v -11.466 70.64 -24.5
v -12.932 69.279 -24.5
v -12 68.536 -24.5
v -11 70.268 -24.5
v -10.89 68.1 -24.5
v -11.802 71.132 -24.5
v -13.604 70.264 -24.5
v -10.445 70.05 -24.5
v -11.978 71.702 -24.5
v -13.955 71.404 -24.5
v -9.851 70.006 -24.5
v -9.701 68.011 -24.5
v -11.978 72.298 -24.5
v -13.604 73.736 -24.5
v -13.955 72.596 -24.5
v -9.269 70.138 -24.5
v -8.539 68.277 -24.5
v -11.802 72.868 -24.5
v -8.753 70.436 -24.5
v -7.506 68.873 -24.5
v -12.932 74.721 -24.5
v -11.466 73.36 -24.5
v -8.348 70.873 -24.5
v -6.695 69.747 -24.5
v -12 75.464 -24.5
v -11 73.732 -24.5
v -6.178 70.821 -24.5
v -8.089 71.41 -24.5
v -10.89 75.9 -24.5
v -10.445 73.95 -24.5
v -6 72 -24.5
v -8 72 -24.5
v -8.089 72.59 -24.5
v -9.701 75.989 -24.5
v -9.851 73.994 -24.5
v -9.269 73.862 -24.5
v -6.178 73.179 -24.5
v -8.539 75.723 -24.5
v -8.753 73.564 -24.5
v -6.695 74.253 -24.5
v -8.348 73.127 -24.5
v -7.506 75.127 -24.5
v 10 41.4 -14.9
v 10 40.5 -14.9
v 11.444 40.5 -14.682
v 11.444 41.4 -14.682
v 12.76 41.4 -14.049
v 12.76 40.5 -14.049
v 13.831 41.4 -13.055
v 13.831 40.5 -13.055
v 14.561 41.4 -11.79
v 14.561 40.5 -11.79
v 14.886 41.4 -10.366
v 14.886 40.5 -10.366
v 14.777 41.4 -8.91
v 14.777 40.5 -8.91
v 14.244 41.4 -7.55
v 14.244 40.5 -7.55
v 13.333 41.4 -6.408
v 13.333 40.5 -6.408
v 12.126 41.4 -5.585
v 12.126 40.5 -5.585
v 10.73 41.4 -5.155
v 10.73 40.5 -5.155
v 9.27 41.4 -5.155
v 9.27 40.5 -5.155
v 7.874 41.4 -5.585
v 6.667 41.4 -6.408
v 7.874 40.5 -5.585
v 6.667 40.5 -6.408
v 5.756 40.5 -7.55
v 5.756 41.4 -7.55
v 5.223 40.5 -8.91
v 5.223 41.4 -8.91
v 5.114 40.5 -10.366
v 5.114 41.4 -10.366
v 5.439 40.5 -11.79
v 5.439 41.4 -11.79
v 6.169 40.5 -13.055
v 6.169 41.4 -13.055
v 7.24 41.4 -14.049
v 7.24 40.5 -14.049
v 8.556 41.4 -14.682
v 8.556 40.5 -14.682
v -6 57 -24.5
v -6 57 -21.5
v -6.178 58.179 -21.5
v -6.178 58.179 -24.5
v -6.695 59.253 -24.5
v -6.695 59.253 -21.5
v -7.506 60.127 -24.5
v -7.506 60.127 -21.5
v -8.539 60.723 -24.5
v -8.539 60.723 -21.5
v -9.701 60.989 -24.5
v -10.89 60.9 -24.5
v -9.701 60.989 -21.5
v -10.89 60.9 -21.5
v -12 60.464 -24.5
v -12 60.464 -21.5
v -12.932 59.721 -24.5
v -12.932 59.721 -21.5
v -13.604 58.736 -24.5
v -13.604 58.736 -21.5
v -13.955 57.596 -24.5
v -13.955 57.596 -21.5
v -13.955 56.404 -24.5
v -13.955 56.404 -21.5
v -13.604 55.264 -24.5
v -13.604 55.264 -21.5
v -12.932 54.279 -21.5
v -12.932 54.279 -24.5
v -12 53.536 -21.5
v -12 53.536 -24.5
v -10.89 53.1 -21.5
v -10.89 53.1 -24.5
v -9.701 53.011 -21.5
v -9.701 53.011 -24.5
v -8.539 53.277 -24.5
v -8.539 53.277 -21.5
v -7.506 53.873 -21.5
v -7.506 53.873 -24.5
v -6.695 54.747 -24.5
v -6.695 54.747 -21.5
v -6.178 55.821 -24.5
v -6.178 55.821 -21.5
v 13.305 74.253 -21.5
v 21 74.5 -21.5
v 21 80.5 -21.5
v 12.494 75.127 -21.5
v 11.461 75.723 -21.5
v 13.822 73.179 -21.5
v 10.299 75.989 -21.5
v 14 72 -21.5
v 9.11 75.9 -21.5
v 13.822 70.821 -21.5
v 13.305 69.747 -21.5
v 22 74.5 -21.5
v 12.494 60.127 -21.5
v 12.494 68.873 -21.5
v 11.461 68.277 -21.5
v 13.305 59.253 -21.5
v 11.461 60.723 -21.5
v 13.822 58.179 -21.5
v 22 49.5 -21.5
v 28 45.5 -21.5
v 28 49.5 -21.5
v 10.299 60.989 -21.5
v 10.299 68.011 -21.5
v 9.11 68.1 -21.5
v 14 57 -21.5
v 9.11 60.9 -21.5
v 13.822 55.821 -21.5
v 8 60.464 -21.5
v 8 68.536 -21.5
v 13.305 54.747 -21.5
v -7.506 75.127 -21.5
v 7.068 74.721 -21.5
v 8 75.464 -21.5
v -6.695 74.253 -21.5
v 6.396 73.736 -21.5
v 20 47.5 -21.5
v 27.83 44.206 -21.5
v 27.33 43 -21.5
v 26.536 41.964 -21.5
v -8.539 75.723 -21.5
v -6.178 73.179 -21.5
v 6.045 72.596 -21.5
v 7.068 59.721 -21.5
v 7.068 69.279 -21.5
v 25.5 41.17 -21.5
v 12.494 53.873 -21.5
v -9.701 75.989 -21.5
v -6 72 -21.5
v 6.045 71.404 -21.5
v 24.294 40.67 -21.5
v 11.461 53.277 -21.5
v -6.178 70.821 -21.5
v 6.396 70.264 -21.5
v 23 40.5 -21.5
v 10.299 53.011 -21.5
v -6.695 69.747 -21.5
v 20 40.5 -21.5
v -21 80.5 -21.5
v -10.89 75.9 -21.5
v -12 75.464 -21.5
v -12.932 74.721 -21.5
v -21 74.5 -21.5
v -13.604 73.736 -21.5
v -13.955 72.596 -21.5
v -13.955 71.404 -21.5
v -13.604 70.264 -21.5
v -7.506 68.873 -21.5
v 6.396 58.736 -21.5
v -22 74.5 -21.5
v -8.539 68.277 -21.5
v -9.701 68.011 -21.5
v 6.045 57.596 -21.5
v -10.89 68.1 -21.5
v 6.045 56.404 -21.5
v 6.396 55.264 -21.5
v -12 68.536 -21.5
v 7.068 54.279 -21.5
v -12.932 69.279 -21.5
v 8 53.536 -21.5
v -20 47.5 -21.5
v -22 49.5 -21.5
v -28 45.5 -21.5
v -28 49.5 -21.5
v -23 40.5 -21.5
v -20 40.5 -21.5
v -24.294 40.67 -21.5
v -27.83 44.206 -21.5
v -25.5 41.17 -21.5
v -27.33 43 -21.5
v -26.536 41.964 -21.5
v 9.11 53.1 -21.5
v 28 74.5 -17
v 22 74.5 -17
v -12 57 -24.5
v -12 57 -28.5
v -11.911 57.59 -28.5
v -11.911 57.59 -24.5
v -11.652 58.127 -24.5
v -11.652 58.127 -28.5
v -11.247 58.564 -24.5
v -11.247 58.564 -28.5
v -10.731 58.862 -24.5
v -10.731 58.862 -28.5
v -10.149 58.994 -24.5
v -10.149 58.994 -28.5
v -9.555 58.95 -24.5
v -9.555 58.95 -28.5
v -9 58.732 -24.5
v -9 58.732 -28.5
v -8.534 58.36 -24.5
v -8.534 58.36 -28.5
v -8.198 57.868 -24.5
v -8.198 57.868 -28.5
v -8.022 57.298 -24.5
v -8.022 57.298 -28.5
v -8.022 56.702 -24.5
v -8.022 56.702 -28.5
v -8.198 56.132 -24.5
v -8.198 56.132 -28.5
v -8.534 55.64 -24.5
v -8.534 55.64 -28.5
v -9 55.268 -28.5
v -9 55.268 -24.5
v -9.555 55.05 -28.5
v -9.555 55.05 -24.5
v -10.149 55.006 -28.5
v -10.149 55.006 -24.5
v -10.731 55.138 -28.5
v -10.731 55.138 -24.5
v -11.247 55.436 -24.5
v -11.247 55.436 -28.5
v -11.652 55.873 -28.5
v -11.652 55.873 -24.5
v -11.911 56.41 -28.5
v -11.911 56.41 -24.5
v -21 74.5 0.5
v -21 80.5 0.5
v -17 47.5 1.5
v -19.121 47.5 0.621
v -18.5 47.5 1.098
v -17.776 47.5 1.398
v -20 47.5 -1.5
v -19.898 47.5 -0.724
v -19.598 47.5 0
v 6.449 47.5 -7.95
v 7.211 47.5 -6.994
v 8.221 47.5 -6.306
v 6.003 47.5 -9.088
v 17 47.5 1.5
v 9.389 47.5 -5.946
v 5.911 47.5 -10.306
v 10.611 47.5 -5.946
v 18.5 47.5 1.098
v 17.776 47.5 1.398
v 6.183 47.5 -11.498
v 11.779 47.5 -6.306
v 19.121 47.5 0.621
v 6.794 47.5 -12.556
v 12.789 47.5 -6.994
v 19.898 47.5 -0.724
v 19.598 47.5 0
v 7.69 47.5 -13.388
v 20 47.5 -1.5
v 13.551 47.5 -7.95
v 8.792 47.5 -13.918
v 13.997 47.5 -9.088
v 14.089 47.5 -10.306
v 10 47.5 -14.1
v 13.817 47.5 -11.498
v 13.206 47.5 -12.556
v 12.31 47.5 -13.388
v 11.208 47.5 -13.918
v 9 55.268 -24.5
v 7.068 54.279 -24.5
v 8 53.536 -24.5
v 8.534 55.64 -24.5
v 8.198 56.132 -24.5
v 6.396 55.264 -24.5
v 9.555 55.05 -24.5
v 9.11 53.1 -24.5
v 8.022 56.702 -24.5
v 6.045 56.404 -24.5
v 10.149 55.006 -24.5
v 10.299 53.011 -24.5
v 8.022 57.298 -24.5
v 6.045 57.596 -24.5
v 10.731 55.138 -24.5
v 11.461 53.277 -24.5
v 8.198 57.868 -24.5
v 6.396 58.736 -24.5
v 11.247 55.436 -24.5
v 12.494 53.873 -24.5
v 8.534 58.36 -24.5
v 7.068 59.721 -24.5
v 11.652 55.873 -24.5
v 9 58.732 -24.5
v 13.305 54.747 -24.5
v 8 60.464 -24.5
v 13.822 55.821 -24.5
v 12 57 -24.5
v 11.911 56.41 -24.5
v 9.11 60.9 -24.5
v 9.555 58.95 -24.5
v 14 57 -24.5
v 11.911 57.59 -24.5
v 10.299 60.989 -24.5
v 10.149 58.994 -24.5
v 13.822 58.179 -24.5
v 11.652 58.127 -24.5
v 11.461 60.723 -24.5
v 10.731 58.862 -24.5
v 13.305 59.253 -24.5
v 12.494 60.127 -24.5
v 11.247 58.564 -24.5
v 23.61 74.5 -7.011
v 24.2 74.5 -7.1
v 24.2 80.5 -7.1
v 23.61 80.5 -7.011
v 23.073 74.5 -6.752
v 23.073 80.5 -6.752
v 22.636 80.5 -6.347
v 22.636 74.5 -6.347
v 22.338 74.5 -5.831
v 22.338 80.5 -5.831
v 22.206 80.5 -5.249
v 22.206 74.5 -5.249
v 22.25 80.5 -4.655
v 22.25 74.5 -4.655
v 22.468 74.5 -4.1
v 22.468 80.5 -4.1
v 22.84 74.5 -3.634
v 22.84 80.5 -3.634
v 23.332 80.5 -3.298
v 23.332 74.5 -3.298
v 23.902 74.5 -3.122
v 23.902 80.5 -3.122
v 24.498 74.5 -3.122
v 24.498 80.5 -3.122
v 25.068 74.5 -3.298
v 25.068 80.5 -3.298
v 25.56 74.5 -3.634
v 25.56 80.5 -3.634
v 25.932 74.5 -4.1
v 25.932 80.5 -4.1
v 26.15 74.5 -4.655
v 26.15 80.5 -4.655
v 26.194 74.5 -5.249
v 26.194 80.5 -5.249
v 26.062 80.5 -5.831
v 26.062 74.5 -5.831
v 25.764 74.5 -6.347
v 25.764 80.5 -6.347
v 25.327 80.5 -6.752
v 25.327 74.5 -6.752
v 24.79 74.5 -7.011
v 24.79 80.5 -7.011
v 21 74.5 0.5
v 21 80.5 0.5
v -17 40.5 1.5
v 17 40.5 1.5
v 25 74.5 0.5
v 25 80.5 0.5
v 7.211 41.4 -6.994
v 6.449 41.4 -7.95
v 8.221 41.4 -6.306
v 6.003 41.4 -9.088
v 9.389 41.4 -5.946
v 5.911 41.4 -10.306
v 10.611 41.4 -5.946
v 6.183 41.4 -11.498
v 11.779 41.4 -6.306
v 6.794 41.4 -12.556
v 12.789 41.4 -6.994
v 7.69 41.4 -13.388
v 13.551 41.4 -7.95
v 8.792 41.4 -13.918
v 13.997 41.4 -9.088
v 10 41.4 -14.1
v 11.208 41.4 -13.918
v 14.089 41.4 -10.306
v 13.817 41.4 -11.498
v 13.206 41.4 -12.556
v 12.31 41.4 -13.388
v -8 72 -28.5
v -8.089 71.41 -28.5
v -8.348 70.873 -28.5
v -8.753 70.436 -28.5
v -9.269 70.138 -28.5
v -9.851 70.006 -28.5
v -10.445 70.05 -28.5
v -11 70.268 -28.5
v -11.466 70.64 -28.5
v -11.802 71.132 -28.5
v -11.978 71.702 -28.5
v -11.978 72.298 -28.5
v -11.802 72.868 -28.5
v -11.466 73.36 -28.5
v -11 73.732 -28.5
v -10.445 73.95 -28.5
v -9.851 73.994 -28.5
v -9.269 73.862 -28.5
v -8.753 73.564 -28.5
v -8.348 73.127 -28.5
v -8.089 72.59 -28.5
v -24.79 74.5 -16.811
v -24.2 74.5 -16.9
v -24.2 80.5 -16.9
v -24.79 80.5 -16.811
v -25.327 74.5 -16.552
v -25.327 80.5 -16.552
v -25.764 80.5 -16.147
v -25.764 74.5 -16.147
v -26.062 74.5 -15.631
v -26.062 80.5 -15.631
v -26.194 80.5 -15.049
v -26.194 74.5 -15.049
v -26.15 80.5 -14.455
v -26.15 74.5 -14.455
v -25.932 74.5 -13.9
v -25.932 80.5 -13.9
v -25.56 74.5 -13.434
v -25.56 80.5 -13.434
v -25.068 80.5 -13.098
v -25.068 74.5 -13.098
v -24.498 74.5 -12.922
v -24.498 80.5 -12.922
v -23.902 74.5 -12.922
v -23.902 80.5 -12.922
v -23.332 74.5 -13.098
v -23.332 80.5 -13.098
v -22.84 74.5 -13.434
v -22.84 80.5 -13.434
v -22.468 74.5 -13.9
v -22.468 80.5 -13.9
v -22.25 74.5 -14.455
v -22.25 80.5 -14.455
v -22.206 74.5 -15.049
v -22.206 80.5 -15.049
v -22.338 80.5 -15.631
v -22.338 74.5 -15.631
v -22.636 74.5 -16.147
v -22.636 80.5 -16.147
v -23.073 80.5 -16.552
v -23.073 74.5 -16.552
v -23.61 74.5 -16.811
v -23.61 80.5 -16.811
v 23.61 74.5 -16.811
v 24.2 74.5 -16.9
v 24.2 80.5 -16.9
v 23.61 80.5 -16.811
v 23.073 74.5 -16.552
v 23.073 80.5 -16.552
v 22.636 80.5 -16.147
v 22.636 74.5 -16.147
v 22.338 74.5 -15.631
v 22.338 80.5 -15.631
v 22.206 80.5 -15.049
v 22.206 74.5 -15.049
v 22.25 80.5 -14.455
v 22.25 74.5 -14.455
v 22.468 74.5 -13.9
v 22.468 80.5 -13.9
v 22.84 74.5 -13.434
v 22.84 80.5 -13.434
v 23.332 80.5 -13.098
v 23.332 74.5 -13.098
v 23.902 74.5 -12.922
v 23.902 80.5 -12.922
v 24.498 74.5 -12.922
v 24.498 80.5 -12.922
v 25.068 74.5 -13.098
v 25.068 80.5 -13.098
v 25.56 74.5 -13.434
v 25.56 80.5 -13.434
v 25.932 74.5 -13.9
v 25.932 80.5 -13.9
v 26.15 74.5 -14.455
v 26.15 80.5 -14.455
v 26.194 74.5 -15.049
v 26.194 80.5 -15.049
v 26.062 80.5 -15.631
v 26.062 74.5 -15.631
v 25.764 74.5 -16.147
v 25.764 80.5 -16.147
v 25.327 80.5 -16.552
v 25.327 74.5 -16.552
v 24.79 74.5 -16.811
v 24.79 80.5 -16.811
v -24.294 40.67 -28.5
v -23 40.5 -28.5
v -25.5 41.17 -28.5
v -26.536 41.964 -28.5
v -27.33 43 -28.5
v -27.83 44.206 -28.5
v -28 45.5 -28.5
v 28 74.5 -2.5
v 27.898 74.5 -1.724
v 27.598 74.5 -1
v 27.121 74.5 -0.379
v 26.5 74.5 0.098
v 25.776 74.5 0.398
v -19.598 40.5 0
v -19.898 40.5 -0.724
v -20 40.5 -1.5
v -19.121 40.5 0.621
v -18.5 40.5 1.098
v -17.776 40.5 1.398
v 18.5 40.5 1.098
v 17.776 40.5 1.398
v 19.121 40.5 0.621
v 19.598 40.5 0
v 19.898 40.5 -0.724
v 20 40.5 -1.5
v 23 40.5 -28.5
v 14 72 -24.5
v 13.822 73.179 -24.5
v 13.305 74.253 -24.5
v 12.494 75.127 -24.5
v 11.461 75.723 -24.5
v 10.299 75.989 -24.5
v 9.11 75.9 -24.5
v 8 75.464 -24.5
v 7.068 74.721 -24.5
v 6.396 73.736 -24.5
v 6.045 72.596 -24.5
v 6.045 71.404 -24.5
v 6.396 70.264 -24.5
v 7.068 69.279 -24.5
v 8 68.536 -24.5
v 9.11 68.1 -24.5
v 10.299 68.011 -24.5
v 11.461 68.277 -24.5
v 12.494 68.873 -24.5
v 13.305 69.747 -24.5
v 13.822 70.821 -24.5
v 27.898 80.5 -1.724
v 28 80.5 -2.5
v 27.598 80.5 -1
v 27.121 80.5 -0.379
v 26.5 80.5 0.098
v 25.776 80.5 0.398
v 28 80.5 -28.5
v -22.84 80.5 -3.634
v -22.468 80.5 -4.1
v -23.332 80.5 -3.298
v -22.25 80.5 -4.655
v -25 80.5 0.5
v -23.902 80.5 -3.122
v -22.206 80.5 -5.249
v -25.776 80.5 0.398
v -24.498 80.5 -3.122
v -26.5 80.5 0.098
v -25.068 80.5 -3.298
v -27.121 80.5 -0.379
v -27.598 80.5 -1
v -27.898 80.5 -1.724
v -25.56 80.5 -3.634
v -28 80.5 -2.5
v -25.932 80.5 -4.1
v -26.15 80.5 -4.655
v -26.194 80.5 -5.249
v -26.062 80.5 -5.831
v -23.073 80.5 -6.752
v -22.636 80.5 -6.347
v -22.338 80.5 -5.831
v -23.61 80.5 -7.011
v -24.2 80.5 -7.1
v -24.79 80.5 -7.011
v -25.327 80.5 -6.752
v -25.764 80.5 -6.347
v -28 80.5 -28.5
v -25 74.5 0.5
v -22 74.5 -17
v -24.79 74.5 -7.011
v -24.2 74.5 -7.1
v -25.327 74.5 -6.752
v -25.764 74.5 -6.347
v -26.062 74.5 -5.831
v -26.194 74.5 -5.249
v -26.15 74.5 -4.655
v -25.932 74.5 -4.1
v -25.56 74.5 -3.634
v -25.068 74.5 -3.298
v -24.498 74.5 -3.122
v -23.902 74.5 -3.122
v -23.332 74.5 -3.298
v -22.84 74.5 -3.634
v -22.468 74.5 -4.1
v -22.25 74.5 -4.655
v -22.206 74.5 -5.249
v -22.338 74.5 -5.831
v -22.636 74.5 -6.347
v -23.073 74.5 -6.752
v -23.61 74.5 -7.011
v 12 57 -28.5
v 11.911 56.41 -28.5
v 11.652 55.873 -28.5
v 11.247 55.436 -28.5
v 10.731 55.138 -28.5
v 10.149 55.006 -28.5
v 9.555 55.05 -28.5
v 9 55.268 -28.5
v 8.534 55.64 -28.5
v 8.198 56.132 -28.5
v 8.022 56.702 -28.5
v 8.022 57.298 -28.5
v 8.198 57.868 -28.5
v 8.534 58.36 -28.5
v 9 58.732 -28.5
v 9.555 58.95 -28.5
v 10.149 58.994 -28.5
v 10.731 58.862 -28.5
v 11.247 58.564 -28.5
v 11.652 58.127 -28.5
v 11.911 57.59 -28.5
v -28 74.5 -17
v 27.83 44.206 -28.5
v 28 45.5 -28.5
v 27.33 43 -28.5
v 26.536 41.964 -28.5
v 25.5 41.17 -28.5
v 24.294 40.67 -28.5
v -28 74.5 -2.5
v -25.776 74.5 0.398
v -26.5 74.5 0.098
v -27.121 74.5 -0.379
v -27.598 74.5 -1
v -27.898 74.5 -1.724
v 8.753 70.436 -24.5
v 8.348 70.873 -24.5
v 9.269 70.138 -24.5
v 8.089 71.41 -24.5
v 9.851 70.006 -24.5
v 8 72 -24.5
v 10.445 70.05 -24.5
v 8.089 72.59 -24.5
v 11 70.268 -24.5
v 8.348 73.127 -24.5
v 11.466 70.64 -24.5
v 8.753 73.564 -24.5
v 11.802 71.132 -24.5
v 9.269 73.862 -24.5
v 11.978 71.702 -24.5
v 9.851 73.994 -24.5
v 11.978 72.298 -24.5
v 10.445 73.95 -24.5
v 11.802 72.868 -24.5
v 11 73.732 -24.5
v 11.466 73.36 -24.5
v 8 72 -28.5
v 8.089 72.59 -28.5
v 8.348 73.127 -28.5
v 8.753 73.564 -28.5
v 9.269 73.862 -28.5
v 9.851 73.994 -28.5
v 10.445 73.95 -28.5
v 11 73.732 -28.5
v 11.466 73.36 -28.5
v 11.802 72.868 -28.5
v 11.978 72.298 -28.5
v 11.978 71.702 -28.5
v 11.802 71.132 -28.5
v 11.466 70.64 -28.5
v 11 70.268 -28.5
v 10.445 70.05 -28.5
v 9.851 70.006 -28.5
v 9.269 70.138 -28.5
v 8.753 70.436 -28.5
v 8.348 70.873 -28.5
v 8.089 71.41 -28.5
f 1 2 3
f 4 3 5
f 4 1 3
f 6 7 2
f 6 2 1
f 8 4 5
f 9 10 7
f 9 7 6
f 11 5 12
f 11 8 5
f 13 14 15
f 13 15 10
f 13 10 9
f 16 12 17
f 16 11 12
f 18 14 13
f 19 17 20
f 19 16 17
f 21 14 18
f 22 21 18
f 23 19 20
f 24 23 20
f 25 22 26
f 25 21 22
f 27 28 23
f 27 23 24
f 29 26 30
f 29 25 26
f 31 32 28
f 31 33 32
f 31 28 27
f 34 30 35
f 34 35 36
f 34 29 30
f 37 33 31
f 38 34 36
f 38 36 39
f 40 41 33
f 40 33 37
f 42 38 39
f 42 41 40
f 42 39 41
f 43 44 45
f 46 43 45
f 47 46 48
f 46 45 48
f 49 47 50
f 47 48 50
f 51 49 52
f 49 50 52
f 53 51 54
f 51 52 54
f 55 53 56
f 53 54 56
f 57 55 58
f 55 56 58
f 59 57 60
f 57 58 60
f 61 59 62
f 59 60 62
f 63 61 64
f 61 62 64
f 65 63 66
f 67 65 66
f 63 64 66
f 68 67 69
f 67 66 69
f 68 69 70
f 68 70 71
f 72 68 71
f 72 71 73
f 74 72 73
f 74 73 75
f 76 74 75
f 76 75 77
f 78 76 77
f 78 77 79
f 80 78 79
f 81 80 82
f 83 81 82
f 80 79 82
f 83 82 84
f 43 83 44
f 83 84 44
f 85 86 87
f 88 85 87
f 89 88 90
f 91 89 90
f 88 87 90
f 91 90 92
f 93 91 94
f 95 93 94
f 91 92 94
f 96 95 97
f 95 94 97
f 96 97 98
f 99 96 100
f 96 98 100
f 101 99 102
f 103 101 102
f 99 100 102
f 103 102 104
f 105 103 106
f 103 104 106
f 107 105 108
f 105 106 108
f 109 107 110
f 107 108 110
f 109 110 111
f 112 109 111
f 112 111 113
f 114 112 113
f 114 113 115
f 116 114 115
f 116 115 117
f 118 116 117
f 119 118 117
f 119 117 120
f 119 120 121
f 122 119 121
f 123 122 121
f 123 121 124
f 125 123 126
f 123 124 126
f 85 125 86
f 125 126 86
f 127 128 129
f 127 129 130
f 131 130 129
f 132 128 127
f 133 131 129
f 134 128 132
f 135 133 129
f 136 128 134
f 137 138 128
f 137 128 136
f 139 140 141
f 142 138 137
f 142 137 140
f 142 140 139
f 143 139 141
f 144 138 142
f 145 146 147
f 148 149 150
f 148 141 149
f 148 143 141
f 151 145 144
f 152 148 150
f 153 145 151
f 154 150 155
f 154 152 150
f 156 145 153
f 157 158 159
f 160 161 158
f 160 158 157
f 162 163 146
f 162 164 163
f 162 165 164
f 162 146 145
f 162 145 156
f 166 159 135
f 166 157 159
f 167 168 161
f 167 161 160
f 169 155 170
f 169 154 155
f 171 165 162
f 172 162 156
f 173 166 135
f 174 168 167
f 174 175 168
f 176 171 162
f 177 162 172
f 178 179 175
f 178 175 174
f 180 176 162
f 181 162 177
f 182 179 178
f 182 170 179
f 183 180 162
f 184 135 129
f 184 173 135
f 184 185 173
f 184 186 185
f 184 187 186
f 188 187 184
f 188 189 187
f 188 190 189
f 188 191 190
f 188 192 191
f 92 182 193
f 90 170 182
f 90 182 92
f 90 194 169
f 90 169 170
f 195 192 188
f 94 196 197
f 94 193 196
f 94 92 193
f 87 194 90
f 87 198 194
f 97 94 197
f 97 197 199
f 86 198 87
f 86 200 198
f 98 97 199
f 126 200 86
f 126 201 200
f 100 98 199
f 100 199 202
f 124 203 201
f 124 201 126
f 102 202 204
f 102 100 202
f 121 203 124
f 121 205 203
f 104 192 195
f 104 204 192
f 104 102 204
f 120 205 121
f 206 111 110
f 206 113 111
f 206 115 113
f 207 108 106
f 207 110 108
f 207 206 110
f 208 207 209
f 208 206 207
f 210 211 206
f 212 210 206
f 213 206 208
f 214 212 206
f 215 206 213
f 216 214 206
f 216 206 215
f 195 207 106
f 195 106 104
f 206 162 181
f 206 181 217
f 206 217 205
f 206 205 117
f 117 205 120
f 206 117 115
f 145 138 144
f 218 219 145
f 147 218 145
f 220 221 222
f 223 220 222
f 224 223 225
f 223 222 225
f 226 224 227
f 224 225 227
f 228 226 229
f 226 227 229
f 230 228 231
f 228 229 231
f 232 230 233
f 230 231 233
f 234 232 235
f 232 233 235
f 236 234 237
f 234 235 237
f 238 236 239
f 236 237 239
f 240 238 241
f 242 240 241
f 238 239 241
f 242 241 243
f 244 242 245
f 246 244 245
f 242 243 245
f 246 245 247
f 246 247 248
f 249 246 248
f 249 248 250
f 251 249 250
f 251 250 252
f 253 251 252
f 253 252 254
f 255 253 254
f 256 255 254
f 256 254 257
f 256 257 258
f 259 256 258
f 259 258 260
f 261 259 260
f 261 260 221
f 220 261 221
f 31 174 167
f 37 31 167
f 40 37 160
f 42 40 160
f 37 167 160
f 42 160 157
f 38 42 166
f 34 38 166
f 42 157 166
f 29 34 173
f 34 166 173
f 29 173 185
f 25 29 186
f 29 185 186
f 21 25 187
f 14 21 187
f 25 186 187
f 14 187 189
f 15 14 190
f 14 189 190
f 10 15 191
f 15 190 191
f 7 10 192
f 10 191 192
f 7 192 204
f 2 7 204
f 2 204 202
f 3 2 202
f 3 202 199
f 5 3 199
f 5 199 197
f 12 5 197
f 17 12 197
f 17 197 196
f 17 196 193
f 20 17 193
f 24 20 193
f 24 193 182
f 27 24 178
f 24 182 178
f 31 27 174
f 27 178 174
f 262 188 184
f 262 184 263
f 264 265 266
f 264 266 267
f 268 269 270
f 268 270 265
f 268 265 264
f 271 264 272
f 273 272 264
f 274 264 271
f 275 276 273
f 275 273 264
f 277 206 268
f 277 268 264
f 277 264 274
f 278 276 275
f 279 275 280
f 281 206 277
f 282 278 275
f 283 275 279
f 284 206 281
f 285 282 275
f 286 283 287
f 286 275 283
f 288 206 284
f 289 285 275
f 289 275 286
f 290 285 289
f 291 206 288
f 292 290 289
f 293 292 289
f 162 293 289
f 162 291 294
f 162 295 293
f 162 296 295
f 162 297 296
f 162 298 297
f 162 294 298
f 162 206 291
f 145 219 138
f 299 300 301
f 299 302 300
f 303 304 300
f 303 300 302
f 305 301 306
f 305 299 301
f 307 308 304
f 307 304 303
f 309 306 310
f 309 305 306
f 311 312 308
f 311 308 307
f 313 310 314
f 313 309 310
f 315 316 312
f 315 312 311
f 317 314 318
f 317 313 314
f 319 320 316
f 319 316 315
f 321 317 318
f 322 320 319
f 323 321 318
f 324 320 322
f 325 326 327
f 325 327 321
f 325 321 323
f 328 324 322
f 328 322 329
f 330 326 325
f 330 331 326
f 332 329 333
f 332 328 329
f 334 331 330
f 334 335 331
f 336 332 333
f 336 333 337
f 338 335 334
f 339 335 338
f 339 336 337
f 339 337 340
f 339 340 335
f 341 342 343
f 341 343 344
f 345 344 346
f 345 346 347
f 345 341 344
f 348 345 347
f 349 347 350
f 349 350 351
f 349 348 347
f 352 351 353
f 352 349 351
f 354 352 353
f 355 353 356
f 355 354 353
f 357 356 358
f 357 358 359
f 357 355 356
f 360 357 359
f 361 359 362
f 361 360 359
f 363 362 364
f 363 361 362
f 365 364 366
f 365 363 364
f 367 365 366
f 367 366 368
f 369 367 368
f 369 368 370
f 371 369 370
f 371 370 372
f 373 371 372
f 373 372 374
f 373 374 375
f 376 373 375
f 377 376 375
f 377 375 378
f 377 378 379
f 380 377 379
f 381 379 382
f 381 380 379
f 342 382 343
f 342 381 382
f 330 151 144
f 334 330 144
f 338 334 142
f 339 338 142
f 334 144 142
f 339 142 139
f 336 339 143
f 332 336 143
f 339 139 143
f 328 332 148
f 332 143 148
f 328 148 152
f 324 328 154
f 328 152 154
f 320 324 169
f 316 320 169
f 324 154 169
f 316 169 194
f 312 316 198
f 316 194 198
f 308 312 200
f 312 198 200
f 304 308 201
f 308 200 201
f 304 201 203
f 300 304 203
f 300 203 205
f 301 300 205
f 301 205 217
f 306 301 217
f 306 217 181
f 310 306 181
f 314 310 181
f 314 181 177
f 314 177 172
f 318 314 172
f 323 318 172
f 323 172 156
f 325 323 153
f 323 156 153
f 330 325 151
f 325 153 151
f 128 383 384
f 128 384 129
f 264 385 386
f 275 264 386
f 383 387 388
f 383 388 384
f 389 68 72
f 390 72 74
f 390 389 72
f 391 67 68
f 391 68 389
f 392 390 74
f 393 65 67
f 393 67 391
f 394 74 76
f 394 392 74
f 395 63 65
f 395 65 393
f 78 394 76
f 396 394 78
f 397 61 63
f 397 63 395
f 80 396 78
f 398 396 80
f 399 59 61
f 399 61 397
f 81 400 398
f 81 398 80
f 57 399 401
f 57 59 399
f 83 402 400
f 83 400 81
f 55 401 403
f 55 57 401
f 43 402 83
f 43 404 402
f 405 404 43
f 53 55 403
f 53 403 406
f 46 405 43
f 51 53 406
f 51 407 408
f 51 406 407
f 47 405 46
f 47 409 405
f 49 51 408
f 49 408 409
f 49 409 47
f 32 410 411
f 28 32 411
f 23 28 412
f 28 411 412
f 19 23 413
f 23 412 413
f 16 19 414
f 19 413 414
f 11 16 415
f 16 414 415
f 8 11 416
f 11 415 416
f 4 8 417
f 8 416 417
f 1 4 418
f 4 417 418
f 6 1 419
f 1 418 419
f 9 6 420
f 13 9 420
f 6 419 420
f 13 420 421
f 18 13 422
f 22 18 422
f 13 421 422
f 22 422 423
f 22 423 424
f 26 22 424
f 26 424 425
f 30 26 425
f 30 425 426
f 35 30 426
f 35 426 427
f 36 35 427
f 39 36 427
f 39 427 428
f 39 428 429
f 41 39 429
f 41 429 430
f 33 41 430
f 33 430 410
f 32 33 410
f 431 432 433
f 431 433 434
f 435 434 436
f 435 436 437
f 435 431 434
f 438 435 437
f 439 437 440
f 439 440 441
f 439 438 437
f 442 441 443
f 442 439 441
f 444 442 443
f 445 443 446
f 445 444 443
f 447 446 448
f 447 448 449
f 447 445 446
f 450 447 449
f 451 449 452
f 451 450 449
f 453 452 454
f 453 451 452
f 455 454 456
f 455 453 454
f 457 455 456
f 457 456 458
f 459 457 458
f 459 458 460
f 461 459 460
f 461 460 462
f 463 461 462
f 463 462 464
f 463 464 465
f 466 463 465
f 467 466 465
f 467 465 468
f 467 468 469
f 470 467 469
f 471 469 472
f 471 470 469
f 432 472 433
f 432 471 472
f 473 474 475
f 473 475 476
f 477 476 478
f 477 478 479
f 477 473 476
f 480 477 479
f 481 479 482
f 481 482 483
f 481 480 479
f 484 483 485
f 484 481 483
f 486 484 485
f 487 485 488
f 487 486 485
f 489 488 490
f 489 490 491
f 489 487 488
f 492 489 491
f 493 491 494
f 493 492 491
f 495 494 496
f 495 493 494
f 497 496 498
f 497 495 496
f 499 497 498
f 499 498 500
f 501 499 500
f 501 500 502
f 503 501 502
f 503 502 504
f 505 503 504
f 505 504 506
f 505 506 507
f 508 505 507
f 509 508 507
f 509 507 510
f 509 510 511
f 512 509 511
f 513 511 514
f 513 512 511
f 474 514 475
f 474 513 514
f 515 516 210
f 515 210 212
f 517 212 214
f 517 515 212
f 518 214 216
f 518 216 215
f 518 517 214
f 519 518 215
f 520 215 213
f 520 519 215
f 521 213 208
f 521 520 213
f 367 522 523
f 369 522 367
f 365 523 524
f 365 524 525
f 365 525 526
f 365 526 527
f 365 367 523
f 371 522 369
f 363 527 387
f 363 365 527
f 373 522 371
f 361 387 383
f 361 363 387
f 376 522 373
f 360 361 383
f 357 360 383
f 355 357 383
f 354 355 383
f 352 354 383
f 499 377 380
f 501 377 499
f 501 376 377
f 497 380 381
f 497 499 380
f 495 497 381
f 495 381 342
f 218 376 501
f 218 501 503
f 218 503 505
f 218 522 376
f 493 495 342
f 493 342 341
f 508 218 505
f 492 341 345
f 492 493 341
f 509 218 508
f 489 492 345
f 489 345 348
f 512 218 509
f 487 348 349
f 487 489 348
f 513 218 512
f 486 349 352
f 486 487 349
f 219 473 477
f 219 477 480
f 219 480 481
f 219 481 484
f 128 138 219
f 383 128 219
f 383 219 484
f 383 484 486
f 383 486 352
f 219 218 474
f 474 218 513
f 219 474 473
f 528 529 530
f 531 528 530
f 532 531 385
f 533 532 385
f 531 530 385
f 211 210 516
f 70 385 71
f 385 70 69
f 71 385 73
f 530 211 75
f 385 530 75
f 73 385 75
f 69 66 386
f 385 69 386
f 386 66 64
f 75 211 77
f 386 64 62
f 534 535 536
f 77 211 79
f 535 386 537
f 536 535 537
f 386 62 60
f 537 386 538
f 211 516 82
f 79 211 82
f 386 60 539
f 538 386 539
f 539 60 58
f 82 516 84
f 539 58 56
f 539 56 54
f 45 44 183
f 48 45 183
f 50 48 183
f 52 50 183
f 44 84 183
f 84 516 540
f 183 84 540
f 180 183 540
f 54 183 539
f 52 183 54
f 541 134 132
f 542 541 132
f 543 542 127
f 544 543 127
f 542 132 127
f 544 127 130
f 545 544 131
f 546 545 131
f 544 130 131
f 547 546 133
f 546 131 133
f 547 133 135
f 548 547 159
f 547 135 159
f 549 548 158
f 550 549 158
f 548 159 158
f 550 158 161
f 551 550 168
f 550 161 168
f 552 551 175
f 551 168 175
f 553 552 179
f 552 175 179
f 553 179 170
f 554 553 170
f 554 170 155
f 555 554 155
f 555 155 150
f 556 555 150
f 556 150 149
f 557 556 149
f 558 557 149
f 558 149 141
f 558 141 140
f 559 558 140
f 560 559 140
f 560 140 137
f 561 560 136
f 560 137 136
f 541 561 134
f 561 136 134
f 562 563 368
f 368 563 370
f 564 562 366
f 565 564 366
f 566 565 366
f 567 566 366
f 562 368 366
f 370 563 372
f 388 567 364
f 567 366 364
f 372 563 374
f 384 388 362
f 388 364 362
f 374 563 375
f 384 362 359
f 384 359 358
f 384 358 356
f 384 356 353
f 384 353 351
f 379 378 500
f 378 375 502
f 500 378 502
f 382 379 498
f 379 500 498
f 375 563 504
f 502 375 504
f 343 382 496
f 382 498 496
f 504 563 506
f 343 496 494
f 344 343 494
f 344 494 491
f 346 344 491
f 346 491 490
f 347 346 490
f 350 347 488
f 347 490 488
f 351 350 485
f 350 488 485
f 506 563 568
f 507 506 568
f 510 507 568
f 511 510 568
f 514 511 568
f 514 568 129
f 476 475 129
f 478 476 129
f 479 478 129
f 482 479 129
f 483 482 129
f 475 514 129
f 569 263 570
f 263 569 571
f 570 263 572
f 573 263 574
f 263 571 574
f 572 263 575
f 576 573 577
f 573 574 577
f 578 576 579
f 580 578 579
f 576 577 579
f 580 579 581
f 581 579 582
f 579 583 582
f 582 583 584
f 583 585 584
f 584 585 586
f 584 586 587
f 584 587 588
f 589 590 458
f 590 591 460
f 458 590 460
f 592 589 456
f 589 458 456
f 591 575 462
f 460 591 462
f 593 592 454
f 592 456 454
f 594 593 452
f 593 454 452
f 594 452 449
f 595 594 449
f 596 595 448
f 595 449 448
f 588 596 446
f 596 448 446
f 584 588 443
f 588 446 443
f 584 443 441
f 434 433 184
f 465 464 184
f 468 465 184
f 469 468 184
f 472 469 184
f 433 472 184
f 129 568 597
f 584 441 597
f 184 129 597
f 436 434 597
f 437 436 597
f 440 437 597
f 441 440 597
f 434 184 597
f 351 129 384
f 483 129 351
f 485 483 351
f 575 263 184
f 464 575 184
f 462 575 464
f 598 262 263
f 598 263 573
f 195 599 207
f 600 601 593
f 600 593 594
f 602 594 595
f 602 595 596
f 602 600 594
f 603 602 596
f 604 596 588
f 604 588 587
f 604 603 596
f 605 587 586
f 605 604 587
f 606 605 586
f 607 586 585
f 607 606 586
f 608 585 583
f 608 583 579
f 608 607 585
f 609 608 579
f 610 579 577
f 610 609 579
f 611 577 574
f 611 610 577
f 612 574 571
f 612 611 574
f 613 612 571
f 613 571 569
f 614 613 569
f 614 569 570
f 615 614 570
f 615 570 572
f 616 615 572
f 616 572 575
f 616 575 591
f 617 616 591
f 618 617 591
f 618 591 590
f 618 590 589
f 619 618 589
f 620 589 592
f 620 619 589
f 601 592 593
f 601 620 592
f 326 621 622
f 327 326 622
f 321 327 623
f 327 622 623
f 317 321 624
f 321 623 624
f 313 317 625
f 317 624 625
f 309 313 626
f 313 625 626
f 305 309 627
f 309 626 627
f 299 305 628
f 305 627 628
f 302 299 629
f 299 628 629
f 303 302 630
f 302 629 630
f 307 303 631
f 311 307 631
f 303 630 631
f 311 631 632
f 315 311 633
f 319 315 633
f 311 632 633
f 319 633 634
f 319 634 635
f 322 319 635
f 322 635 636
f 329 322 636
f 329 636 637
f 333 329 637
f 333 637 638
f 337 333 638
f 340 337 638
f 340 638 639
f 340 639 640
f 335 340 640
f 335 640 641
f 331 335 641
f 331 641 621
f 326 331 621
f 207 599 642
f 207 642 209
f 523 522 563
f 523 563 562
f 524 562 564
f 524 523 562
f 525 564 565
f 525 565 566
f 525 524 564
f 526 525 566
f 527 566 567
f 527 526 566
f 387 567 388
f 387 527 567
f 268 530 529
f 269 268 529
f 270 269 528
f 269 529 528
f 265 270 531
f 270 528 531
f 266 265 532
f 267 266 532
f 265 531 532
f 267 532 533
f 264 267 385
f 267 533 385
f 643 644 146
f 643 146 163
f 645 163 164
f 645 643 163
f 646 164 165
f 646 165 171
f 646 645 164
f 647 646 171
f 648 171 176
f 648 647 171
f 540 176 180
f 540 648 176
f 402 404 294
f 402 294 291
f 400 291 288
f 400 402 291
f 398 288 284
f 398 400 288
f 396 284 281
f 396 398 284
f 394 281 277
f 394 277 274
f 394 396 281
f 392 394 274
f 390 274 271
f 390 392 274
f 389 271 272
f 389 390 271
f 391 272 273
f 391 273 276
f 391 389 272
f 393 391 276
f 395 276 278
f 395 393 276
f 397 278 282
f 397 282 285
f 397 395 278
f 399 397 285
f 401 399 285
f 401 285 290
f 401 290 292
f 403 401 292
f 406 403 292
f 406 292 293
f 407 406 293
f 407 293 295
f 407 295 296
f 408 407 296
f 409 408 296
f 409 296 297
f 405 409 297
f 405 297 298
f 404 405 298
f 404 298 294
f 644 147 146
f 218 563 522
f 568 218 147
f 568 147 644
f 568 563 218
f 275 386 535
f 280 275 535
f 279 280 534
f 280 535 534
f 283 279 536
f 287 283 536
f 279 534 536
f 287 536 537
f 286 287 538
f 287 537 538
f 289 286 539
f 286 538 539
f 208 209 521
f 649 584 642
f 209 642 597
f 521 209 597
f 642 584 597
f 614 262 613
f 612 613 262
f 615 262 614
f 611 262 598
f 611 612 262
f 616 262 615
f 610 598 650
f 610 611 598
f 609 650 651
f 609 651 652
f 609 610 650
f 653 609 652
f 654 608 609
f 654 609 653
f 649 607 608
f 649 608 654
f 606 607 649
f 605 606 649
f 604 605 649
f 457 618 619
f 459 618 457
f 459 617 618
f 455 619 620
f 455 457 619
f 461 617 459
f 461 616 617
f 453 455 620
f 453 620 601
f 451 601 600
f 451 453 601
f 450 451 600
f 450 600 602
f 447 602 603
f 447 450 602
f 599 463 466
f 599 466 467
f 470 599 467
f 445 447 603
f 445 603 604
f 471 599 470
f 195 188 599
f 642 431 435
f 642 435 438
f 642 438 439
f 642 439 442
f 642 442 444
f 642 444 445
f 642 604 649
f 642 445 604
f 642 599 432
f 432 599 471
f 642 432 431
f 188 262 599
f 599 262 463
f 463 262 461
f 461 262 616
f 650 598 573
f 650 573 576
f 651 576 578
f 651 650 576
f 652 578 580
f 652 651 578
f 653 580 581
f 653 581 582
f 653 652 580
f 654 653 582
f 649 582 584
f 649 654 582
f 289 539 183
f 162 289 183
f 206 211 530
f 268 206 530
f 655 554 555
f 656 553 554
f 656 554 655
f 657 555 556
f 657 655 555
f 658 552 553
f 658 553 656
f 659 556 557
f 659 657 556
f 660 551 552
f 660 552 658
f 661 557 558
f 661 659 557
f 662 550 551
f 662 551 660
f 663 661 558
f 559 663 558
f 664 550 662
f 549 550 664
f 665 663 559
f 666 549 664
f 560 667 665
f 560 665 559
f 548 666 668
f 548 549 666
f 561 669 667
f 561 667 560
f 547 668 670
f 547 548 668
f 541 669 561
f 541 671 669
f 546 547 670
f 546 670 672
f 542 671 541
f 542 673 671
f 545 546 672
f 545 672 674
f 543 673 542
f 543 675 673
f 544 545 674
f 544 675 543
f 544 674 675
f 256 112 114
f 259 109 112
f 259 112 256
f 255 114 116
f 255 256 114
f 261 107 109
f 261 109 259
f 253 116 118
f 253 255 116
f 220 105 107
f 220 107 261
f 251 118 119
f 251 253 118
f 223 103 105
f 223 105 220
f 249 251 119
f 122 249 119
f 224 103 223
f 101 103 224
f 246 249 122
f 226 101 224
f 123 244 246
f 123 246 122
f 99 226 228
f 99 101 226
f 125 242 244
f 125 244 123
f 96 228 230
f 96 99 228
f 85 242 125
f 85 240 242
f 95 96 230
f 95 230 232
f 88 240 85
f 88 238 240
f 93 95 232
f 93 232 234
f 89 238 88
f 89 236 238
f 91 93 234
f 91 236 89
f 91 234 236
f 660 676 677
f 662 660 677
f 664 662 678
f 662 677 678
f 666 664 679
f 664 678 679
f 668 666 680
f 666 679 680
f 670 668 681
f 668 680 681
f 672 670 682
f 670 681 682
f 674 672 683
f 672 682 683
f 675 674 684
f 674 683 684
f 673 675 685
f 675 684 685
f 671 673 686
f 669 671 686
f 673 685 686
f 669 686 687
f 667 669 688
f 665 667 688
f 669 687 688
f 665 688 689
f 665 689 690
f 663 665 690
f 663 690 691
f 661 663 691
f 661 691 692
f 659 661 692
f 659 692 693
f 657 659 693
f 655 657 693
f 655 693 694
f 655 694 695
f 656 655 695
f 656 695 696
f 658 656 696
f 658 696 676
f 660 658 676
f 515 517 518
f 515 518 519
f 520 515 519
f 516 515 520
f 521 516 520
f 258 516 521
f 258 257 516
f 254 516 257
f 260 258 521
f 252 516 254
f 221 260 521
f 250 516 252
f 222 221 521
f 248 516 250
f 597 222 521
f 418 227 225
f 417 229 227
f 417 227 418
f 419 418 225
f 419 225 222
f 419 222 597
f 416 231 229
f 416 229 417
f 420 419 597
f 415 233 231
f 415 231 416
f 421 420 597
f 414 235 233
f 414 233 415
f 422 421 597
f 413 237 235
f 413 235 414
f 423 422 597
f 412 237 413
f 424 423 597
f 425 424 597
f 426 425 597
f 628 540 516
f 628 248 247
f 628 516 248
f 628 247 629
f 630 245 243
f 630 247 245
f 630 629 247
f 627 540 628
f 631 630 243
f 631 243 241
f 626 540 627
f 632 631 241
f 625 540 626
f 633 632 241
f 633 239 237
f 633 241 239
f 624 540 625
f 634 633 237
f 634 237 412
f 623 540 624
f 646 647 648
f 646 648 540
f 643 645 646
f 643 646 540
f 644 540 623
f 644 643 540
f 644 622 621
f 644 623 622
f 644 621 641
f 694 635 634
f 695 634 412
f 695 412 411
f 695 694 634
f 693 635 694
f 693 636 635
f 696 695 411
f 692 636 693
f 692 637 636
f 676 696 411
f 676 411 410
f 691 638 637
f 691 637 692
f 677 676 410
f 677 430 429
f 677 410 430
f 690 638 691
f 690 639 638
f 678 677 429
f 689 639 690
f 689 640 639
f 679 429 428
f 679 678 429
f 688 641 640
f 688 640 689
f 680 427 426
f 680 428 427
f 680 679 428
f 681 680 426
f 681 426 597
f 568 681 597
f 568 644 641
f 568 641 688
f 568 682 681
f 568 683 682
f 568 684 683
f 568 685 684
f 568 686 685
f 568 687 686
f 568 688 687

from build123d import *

# Parameters (mm, degrees)
EXTRUDE_START       = 74.5
SKETCH_4_R          = 2
EXTRUDE_1_DEPTH     = 6
SKETCH_5_W          = 40
SKETCH_5_H          = 34
SKETCH_5_R          = 2
EXTRUDE_2_DEPTH     = 7
CUT_EXTRUDE_START   = -21.5
SKETCH_6_R          = 4
CUT_EXTRUDE_1_DEPTH = 3
EXTRUDE_START_2     = 40.5
SKETCH_7_R          = 4.1
EXTRUDE_3_DEPTH     = 7
SKETCH_8_R          = 4.9
CUT_EXTRUDE_2_DEPTH = 0.9
EXTRUDE_START_3     = 2
EXTRUDE_4_DEPTH     = 6
EXTRUDE_5_DEPTH     = 6
SKETCH_13_W         = 30
SKETCH_13_H         = 25
EXTRUDE_6_DEPTH     = 7


with BuildPart() as part:
    # 草图4 → 凸台-拉伸1 (new body)
    with BuildSketch(Plane(origin=(0, 0, 0), x_dir=(1, 0, 0), z_dir=(0, 1, 0)).offset(EXTRUDE_START)):
        with BuildLine():
            Line((-28, 28.5), (28, 28.5))
            Line((28, 28.5), (28, 2.5))
            ThreePointArc((28, 2.5), (27.121320344, 0.378679656), (25, -0.5))
            Line((25, -0.5), (21, -0.5))
            Line((21, -0.5), (21, 21.5))
            Line((21, 21.5), (-21, 21.5))
            Line((-21, 21.5), (-21, -0.5))
            Line((-21, -0.5), (-25, -0.5))
            ThreePointArc((-25, -0.5), (-27.121320344, 0.378679656), (-28, 2.5))
            Line((-28, 2.5), (-28, 28.5))
        make_face()
        with Locations(Location((-24.2, 14.9, 0), (0, 0, 90))):
            Circle(SKETCH_4_R, mode=Mode.SUBTRACT)
        with Locations(Location((-24.2, 5.1, 0), (0, 0, 90))):
            Circle(SKETCH_4_R, mode=Mode.SUBTRACT)
        with Locations(Location((24.2, 14.9, 0), (0, 0, 90))):
            Circle(SKETCH_4_R, mode=Mode.SUBTRACT)
        with Locations(Location((24.2, 5.1, 0), (0, 0, 90))):
            Circle(SKETCH_4_R, mode=Mode.SUBTRACT)
    extrude(amount=EXTRUDE_1_DEPTH)

    # 草图5 → 凸台-拉伸2 (add)
    with BuildSketch(Plane(origin=(0, 0, -28.5), x_dir=(-1, 0, 0), z_dir=(0, 0, -1))):
        with Locations((0, 57.5)):
            Rectangle(SKETCH_5_W, SKETCH_5_H)
        with Locations((-10, 72)):
            Circle(SKETCH_5_R, mode=Mode.SUBTRACT)
        with Locations(Location((10, 72, 0), (0, 0, 180))):
            Circle(SKETCH_5_R, mode=Mode.SUBTRACT)
        with Locations((10, 57)):
            Circle(SKETCH_5_R, mode=Mode.SUBTRACT)
        with Locations(Location((-10, 57, 0), (0, 0, 180))):
            Circle(SKETCH_5_R, mode=Mode.SUBTRACT)
    extrude(amount=-EXTRUDE_2_DEPTH)

    # 草图6 → 切除-拉伸1 (cut)
    with BuildSketch(Plane.XY.offset(CUT_EXTRUDE_START)):
        with Locations((-10, 72)):
            Circle(SKETCH_6_R)
        with Locations((10, 72)):
            Circle(SKETCH_6_R)
        with Locations((-10, 57)):
            Circle(SKETCH_6_R)
        with Locations((10, 57)):
            Circle(SKETCH_6_R)
    extrude(amount=-CUT_EXTRUDE_1_DEPTH, mode=Mode.SUBTRACT)

    # 草图7 → 凸台-拉伸3 (add)
    with BuildSketch(Plane(origin=(0, 0, 0), x_dir=(1, 0, 0), z_dir=(0, 1, 0)).offset(EXTRUDE_START_2)):
        with BuildLine():
            Line((20, 21.5), (-20, 21.5))
            Line((-20, 21.5), (-20, 1.5))
            ThreePointArc((-20, 1.5), (-19.121320344, -0.621320344), (-17, -1.5))
            Line((-17, -1.5), (17, -1.5))
            ThreePointArc((17, -1.5), (19.121320344, -0.621320344), (20, 1.5))
            Line((20, 1.5), (20, 21.5))
        make_face()
        with Locations(Location((10, 10, 0), (0, 0, 90))):
            Circle(SKETCH_7_R, mode=Mode.SUBTRACT)
    extrude(amount=EXTRUDE_3_DEPTH)

    # 草图8 → 切除-拉伸2 (cut)
    with BuildSketch(Plane.XZ.offset(-40.5)):
        with Locations(Location((10, -10, 0), (0, 0, 270))):
            Circle(SKETCH_8_R)
    extrude(amount=-CUT_EXTRUDE_2_DEPTH, mode=Mode.SUBTRACT)

    # 草图10 → 凸台-拉伸4 (add)
    with BuildSketch(Plane(origin=(20, 0, 0), x_dir=(0, 0, -1), z_dir=(1, 0, 0)).offset(EXTRUDE_START_3)):
        Polygon((28.5, 49.5), (28.5, 74.5), (17, 74.5), (21.5, 49.5), align=None)
    extrude(amount=EXTRUDE_4_DEPTH)

    # 草图12 → 凸台-拉伸5 (add)
    with BuildSketch(Plane.ZY.offset(20).offset(EXTRUDE_START_3)):
        Polygon((-21.5, 49.5), (-28.5, 49.5), (-28.5, 74.5), (-17, 74.5), align=None)
    extrude(amount=EXTRUDE_5_DEPTH)

    # 草图13 → 凸台-拉伸6 (add)
    with BuildSketch(Plane(origin=(0, 0, -28.5), x_dir=(-1, 0, 0), z_dir=(0, 0, -1))):
        with BuildLine():
            Line((28, 80.5), (-28, 80.5))
            Line((-28, 80.5), (-28, 45.5))
            ThreePointArc((-28, 45.5), (-26.535533906, 41.964466094), (-23, 40.5))
            Line((-23, 40.5), (23, 40.5))
            ThreePointArc((23, 40.5), (26.535533906, 41.964466094), (28, 45.5))
            Line((28, 45.5), (28, 80.5))
        make_face()
        with Locations((0, 65)):
            Rectangle(SKETCH_13_W, SKETCH_13_H, mode=Mode.SUBTRACT)
    extrude(amount=-EXTRUDE_6_DEPTH)


solid = part.part
